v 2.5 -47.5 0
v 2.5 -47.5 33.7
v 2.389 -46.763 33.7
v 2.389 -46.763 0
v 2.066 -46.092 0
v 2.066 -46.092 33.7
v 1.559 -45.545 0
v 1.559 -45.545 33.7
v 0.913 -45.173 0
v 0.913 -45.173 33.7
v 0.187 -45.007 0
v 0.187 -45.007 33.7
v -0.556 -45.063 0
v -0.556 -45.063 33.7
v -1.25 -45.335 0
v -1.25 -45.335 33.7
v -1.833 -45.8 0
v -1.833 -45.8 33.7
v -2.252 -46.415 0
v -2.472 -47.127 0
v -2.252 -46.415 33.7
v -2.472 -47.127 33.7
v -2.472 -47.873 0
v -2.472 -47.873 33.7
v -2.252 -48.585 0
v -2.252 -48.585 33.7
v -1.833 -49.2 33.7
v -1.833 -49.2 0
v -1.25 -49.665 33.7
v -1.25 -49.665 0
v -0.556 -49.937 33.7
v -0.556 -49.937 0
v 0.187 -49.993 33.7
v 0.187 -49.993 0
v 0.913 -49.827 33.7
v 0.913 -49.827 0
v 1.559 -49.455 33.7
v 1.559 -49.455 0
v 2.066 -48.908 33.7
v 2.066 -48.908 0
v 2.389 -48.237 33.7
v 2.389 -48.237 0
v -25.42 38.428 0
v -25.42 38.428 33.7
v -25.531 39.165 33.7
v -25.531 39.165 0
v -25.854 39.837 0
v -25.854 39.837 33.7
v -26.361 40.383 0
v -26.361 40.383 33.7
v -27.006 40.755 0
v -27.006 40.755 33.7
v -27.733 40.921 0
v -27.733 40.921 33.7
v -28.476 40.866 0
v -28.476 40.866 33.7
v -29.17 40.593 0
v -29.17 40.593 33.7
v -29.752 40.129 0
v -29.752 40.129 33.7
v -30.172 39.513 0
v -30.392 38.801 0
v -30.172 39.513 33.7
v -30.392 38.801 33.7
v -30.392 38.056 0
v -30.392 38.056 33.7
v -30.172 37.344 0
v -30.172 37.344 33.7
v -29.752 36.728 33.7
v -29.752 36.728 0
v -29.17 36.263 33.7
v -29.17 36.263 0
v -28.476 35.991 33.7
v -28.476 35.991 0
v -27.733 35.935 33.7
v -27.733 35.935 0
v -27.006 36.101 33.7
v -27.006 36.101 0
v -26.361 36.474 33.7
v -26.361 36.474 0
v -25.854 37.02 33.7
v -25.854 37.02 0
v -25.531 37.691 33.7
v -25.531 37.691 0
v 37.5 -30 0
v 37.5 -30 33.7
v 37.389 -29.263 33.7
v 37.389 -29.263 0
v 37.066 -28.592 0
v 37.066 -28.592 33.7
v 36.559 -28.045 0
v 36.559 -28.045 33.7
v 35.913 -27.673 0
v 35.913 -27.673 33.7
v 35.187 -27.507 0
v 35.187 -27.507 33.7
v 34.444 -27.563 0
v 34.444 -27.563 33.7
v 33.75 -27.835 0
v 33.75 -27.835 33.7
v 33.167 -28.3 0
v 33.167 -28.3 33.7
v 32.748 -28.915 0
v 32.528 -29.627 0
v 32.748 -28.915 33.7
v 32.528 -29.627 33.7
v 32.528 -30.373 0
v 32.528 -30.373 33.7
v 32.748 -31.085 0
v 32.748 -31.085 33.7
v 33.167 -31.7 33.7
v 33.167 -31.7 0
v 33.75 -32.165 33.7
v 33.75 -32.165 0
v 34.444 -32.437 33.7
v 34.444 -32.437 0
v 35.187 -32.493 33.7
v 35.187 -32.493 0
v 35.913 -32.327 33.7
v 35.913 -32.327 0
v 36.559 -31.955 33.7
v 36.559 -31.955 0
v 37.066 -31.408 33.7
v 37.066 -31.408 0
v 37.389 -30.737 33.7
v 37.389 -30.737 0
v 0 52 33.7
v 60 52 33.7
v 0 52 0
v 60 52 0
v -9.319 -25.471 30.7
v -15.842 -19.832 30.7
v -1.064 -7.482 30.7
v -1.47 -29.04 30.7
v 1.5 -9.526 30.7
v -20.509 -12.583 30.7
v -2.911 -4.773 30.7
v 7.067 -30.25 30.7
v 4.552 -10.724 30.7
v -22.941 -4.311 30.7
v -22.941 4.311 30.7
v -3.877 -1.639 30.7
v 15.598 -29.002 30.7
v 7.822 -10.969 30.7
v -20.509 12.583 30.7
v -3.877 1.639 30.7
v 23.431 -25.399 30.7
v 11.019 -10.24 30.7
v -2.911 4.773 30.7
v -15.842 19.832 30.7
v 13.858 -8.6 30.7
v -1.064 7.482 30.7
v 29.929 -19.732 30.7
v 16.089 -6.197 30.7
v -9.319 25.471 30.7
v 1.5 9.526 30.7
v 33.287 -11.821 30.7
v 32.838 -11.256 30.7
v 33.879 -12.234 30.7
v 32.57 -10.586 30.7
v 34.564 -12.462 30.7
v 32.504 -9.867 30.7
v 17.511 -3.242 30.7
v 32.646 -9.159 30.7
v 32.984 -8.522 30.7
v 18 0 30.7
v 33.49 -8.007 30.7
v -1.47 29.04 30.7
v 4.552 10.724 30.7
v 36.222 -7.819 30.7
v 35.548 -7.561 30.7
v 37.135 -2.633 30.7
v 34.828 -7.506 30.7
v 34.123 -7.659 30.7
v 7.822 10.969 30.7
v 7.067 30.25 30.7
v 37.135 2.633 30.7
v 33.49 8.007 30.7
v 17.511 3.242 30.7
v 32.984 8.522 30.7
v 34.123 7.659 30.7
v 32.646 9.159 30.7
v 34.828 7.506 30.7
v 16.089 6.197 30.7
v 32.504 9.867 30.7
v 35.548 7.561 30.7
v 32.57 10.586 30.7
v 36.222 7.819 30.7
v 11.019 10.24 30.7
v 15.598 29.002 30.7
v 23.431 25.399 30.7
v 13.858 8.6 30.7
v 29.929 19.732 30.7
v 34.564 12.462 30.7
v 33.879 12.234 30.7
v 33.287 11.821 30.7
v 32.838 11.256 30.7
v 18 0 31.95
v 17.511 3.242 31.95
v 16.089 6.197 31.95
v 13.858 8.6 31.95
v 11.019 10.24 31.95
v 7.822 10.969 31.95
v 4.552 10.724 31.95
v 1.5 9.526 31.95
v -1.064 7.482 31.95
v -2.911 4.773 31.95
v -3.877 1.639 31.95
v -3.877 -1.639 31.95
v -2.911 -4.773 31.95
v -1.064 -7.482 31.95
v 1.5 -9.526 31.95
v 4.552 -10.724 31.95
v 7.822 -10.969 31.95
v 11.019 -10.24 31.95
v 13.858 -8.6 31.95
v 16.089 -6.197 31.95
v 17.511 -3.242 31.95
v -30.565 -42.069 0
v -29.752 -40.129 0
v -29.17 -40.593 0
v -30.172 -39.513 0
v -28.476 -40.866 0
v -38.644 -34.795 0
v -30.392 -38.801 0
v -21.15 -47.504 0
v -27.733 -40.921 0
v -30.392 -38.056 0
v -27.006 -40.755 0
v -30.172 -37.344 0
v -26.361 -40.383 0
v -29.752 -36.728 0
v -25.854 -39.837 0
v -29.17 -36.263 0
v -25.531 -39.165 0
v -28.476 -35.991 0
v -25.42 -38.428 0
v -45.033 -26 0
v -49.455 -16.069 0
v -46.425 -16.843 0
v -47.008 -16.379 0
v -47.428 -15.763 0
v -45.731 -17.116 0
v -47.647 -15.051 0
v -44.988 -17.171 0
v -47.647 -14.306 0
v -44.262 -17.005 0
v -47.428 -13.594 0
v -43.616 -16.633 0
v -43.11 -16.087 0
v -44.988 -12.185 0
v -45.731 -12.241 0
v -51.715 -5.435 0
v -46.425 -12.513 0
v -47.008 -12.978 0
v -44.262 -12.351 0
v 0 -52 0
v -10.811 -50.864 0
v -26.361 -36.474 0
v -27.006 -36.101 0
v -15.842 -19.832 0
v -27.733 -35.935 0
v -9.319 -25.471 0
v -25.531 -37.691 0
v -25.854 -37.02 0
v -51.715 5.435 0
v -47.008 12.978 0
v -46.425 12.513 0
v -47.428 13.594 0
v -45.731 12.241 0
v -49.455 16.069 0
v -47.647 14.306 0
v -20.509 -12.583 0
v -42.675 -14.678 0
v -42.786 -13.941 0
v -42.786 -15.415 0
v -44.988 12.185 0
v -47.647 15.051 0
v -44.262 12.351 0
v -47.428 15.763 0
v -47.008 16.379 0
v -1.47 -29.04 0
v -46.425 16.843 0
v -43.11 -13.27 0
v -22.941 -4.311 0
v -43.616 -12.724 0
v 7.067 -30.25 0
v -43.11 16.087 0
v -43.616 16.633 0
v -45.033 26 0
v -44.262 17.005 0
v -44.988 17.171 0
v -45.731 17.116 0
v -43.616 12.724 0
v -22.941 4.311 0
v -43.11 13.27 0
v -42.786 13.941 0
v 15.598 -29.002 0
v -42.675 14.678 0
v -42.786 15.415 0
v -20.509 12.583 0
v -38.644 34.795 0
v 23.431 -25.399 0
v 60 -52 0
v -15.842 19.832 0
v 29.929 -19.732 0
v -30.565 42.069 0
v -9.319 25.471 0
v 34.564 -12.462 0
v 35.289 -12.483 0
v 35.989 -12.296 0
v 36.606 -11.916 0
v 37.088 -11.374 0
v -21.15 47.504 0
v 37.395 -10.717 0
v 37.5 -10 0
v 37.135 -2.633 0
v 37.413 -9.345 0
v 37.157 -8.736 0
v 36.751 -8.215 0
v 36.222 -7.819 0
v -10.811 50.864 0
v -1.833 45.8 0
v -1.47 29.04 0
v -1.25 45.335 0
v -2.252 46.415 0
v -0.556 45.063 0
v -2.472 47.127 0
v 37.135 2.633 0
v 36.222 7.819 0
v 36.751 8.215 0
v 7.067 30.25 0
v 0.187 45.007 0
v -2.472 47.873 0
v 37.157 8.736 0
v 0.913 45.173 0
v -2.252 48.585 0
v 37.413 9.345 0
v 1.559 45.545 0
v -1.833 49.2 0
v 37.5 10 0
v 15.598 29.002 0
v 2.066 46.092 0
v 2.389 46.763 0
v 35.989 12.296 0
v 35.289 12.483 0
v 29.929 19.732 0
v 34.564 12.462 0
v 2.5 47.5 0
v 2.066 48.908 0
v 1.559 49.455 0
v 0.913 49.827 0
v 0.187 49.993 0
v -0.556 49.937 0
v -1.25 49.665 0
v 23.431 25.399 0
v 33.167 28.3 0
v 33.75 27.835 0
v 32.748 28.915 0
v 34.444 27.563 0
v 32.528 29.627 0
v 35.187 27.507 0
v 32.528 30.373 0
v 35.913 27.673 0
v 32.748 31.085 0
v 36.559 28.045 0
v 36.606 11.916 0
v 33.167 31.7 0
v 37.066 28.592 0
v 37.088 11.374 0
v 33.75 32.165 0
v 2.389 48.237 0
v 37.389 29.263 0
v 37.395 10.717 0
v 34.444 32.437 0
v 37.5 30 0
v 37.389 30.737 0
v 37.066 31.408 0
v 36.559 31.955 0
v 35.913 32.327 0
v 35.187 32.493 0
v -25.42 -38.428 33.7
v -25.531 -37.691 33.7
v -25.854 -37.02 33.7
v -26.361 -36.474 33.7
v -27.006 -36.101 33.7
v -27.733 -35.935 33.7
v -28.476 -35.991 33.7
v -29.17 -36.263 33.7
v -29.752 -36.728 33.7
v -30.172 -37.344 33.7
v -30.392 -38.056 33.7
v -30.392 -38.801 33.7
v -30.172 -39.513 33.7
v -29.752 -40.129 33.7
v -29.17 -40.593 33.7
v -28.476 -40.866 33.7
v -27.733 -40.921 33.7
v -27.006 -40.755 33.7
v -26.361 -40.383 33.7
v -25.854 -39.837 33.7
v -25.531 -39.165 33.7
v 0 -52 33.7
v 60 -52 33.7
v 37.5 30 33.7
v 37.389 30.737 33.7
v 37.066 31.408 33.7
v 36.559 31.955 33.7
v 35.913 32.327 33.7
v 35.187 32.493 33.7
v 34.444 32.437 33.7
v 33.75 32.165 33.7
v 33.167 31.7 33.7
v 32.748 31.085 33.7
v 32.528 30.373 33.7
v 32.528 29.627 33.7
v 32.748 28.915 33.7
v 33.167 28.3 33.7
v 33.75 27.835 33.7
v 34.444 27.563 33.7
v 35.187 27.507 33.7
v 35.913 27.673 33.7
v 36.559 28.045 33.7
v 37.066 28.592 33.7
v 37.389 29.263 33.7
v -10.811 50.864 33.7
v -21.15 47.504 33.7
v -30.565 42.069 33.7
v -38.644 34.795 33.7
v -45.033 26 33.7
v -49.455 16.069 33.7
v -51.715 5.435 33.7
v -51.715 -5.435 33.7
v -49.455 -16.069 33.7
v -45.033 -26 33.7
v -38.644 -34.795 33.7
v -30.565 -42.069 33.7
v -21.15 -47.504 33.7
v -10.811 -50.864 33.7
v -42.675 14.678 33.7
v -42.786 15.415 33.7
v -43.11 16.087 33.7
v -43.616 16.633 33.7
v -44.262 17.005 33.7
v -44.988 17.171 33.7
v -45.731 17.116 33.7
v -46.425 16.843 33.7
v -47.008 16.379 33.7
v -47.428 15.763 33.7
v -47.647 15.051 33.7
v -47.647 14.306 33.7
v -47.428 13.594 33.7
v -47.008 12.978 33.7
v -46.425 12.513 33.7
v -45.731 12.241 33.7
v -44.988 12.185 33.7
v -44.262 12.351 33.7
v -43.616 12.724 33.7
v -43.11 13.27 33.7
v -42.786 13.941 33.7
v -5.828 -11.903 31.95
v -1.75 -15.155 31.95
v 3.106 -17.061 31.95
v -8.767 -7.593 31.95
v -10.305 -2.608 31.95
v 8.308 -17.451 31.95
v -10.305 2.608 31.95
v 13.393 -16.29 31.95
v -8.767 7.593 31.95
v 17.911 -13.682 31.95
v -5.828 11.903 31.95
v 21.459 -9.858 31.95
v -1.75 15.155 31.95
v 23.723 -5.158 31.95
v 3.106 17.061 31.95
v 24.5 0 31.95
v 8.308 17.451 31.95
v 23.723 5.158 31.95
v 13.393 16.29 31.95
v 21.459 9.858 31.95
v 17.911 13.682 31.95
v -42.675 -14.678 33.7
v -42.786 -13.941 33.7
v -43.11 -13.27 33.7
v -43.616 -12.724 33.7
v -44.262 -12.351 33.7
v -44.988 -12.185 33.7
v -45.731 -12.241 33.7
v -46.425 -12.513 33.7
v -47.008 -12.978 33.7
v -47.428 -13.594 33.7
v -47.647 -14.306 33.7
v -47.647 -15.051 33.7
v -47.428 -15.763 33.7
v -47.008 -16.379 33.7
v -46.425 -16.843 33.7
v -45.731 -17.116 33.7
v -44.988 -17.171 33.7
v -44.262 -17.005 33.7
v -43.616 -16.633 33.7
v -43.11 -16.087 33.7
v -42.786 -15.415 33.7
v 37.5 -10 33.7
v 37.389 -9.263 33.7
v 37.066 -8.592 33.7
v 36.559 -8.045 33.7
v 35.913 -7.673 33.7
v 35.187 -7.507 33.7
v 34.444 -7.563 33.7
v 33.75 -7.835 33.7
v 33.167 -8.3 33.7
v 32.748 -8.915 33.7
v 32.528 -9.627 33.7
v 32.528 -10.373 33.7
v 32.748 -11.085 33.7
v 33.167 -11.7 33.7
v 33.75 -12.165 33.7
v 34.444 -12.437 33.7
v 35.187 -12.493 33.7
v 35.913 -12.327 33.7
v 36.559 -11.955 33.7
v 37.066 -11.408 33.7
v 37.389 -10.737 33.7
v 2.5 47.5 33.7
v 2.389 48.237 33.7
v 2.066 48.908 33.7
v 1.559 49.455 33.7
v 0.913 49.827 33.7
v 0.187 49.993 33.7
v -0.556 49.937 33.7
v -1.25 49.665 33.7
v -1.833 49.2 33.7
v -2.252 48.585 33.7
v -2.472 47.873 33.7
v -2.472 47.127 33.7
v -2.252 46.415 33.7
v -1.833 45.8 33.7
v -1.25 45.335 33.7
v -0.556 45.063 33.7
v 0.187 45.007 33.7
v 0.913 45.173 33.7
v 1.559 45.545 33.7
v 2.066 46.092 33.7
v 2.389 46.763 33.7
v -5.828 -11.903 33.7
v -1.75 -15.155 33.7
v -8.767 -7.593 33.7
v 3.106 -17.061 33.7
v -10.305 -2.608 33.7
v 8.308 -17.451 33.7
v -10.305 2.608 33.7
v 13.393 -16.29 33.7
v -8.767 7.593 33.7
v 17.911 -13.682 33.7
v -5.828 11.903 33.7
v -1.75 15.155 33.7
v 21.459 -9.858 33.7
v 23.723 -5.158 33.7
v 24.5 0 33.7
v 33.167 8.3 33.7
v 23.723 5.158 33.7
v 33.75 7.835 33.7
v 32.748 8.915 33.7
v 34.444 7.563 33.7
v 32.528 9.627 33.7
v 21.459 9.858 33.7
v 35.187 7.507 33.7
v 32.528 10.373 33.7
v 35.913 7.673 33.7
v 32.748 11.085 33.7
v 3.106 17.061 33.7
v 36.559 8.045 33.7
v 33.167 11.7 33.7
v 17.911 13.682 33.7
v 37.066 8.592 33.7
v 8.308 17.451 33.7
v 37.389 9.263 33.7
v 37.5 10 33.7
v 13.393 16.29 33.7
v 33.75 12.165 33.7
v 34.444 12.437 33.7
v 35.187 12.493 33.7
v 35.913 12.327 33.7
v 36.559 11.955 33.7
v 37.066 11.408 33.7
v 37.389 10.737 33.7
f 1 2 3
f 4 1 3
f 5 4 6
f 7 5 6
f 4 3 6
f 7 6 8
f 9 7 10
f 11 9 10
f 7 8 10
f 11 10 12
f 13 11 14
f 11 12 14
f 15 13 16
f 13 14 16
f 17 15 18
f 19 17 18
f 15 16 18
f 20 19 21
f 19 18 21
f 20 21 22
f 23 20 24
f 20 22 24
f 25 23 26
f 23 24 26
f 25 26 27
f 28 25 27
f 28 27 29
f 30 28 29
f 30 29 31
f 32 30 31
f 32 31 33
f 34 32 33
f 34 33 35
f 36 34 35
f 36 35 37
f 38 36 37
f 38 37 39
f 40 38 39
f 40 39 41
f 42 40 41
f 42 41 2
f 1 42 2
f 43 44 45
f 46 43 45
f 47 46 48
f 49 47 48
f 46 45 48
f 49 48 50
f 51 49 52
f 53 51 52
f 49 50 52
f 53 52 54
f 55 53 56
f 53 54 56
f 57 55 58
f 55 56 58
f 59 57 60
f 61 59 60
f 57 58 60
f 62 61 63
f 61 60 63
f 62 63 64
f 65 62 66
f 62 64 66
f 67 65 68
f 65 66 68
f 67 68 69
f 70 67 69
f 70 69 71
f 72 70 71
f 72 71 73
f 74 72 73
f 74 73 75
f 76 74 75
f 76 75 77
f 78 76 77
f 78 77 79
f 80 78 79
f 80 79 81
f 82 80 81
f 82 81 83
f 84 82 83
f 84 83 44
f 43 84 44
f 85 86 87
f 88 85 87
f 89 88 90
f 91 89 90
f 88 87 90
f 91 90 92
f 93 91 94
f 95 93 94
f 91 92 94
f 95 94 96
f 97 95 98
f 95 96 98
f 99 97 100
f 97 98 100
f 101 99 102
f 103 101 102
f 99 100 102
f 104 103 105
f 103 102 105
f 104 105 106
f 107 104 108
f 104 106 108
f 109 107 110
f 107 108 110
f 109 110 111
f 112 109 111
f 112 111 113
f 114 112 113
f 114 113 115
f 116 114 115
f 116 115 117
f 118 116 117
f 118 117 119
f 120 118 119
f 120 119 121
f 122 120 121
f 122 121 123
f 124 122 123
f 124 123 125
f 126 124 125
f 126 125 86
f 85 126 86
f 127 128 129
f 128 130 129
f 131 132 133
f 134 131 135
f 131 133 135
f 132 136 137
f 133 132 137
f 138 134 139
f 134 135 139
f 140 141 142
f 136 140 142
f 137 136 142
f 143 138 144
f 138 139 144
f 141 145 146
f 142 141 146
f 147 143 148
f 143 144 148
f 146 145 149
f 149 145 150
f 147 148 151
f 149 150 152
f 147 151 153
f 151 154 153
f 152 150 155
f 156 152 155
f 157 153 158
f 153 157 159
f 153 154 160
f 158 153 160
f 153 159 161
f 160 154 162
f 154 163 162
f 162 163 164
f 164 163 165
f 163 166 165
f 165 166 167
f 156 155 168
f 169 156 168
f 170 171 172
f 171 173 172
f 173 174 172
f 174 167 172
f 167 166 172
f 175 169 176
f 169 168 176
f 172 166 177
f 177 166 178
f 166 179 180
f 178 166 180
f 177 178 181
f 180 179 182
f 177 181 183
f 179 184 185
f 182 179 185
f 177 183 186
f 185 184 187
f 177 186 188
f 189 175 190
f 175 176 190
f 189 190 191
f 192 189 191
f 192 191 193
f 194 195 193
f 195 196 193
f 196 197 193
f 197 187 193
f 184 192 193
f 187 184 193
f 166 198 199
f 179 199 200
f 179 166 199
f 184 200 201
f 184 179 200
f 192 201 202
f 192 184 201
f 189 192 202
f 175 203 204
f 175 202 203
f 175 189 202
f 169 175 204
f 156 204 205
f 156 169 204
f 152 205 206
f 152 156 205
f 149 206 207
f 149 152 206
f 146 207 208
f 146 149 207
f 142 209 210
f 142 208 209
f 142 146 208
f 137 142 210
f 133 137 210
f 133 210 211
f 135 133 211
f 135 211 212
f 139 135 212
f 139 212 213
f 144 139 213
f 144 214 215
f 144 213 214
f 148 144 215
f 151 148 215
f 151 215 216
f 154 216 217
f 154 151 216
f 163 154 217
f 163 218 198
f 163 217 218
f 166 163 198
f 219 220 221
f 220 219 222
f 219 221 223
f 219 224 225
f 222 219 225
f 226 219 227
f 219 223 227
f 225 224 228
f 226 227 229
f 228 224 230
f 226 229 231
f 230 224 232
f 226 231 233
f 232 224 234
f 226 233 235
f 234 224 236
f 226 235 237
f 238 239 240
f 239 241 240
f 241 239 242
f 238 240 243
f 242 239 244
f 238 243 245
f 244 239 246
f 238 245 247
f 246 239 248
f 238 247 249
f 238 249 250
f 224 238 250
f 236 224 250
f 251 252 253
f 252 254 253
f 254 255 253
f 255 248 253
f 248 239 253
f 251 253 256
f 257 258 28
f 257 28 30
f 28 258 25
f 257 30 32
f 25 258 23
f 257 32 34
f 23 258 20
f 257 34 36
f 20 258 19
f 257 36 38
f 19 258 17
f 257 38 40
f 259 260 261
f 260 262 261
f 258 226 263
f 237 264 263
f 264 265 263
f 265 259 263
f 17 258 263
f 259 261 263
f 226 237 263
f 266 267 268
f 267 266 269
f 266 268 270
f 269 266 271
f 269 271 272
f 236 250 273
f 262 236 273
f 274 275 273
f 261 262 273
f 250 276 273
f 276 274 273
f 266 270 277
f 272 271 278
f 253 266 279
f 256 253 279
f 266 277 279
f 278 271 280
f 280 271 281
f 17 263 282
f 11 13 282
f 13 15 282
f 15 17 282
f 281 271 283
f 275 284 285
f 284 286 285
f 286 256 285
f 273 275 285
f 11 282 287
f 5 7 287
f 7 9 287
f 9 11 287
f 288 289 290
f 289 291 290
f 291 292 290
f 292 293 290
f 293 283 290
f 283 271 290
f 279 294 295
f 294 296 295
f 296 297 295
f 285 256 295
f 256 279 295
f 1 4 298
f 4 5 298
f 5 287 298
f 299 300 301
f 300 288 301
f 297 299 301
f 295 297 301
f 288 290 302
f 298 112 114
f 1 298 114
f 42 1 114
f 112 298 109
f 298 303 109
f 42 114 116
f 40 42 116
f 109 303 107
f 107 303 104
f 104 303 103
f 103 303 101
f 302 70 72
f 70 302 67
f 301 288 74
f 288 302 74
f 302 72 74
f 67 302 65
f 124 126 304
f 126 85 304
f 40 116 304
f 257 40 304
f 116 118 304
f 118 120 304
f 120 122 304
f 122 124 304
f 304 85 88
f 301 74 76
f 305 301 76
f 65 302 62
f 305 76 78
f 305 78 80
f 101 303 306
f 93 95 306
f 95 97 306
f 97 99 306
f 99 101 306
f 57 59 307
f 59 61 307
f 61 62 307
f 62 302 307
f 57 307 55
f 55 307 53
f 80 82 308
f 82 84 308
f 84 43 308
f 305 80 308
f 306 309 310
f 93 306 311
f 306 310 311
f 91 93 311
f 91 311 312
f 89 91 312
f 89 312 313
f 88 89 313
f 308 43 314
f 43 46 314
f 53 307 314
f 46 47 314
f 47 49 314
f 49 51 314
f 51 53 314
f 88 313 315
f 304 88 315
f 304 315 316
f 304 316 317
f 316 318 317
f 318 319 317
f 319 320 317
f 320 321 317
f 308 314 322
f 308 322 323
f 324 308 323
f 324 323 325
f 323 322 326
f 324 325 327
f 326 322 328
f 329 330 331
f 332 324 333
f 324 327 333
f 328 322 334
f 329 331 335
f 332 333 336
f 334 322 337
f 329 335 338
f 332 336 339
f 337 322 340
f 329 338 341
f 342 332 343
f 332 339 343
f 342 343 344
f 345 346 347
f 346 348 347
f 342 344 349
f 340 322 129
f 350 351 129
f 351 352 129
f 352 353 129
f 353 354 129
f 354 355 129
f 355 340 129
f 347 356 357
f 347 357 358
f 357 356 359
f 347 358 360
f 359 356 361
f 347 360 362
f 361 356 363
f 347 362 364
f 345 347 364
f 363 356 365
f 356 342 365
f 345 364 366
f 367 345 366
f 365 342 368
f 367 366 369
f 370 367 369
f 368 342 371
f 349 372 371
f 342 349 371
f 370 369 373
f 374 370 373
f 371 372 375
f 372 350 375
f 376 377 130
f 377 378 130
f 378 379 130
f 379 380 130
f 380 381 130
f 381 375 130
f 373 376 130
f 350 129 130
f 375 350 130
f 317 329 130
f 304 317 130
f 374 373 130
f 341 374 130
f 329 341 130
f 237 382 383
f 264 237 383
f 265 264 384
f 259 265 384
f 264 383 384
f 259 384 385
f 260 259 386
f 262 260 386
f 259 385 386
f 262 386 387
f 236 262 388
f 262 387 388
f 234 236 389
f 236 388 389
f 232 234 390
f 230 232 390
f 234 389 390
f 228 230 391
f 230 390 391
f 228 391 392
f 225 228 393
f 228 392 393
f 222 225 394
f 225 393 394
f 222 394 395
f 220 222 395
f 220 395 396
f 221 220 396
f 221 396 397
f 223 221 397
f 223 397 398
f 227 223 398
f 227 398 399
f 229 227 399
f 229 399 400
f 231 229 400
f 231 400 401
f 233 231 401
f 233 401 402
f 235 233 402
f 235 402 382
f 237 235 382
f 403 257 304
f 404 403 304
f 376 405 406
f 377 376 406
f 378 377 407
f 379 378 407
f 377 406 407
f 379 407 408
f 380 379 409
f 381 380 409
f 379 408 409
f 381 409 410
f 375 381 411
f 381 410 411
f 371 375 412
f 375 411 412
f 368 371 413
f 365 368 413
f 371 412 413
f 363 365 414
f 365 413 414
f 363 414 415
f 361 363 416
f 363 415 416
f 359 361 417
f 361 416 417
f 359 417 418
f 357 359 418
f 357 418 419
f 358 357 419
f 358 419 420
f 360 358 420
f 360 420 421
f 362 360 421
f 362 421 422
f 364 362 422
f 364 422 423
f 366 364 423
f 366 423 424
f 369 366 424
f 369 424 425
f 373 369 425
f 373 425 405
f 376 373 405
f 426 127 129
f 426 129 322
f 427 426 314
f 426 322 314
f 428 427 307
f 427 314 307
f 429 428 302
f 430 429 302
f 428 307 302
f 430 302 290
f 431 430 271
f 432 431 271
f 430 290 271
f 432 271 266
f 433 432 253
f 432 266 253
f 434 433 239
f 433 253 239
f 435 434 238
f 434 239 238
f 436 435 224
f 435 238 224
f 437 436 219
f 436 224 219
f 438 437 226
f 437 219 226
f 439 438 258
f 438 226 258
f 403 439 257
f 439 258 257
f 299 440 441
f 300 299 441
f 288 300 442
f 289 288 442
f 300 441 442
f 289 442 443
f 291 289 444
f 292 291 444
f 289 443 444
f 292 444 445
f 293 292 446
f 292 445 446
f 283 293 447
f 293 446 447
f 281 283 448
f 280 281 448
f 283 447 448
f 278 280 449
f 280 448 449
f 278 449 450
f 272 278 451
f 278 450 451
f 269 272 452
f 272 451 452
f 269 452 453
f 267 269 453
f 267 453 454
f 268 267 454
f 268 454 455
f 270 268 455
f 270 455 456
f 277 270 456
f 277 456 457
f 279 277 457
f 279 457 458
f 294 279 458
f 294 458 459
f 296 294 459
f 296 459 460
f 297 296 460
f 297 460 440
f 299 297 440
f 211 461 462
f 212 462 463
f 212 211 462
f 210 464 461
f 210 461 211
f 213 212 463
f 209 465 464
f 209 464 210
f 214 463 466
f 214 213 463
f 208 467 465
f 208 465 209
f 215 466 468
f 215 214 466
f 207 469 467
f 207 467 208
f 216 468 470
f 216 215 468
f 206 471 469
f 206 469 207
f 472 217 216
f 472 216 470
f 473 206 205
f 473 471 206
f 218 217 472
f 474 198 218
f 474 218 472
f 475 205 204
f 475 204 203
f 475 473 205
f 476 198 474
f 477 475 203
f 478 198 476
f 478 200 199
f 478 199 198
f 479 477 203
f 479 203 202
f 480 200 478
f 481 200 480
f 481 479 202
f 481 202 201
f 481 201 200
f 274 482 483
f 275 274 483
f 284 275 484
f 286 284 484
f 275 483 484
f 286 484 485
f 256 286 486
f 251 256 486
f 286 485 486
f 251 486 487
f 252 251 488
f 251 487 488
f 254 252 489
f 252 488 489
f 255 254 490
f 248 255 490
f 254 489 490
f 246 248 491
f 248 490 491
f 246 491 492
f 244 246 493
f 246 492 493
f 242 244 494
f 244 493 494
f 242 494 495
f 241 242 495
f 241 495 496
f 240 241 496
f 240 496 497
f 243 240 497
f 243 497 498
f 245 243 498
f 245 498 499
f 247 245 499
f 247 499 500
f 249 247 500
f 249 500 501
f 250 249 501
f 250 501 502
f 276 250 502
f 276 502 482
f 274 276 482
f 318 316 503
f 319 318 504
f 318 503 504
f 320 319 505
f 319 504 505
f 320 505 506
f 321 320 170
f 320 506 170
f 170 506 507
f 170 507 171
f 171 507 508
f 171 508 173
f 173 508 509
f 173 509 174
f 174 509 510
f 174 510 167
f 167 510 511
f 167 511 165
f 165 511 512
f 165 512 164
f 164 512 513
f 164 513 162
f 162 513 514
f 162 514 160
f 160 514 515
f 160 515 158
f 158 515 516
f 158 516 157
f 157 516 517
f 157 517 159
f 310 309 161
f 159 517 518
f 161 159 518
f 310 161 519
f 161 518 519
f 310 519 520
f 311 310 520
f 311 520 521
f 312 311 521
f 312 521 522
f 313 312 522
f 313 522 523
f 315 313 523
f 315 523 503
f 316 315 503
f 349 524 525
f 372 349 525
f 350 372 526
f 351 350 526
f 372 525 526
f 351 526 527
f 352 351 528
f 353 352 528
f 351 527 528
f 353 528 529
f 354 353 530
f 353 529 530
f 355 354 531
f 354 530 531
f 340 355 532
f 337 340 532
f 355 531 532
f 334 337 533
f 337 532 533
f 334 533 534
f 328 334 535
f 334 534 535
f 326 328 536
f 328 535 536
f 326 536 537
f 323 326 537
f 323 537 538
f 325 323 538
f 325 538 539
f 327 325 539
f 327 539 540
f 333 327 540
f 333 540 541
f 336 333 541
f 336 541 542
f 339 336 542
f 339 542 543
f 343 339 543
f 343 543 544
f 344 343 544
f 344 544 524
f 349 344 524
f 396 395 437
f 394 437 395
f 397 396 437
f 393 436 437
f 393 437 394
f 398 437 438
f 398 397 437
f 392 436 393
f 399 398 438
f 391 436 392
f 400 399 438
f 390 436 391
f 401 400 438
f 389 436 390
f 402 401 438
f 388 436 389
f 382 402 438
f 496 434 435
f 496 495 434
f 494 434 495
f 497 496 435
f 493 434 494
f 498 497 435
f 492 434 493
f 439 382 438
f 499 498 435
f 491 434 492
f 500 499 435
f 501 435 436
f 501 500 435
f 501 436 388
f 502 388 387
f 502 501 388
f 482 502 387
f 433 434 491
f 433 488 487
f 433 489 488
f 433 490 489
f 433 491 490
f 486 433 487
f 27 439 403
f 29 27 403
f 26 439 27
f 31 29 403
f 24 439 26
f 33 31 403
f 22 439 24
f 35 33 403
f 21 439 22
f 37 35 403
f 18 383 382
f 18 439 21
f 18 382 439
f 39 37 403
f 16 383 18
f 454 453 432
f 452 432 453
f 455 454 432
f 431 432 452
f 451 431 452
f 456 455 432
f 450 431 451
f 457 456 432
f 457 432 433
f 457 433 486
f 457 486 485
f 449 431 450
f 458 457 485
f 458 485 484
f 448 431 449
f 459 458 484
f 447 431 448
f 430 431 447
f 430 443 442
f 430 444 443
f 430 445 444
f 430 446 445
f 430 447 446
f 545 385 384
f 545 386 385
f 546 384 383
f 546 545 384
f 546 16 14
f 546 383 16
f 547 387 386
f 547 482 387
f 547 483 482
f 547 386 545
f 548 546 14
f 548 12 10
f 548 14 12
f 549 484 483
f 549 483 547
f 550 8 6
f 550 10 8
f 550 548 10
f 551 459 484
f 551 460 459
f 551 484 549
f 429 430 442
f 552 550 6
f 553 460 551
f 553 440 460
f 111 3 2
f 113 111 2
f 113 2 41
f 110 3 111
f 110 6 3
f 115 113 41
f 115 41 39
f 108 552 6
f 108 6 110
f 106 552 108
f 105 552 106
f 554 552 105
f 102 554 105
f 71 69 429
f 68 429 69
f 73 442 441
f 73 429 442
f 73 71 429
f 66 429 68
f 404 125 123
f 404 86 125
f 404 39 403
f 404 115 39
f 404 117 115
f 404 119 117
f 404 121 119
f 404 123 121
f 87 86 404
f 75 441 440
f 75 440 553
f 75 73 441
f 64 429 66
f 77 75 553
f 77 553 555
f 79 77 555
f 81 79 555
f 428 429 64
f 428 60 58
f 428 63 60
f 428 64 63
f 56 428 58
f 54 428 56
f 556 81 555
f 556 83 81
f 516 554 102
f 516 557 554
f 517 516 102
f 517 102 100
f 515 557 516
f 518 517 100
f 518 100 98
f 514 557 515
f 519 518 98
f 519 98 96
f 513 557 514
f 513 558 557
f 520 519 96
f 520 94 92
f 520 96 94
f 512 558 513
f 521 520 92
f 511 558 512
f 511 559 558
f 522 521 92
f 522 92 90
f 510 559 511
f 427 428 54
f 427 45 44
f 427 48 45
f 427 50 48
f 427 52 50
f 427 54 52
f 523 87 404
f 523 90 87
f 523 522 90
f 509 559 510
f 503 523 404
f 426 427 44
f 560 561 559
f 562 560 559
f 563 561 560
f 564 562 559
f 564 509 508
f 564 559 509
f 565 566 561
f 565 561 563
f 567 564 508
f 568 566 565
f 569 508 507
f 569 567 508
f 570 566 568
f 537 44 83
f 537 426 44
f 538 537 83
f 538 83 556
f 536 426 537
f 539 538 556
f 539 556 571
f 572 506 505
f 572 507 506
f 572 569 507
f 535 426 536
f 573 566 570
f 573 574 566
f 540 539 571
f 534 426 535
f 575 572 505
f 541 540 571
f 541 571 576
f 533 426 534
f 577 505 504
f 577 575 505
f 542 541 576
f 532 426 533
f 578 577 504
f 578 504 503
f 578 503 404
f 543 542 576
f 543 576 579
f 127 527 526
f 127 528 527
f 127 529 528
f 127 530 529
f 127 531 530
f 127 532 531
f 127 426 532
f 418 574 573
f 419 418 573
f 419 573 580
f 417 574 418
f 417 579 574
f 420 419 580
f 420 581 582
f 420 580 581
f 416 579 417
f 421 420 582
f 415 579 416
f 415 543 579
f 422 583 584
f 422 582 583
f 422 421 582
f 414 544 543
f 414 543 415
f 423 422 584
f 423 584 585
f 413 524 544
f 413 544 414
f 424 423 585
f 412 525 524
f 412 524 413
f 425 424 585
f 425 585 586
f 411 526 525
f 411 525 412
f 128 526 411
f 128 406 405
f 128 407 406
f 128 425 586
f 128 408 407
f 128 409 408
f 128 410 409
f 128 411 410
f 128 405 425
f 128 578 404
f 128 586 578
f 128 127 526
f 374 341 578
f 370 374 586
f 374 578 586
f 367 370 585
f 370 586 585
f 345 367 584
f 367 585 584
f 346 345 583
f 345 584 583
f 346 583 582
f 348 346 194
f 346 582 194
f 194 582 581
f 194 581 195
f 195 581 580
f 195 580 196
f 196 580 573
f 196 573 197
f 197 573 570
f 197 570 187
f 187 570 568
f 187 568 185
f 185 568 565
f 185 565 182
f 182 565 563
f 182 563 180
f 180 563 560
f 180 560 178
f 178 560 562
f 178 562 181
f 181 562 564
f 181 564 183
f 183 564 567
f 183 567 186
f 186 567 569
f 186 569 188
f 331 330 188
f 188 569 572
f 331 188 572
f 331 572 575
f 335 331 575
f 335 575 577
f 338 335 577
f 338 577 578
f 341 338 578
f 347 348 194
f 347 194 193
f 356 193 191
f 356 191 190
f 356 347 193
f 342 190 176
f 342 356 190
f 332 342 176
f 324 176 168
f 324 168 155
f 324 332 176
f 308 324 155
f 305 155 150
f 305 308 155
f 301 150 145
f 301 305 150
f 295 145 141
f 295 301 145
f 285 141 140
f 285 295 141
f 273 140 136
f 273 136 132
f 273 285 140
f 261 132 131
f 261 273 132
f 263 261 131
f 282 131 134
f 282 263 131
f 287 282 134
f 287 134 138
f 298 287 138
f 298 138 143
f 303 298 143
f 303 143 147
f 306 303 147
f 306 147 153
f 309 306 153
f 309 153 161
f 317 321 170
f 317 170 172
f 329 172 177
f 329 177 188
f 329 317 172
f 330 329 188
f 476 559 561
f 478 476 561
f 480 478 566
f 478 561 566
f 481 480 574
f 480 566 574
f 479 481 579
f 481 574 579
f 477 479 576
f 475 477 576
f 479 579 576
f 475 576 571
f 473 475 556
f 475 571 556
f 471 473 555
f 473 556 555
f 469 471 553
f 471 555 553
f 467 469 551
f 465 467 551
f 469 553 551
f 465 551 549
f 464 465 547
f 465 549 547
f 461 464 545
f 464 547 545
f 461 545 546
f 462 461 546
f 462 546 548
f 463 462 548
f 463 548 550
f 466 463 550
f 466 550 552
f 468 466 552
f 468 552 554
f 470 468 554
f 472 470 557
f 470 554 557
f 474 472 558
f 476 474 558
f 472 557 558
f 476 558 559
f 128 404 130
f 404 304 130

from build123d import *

# Parameters (mm, degrees)
CROQUIS1_R              = 30.25
SALIENTE_EXTRUIR1_DEPTH = 30.7
CROQUIS2_R              = 11
SALIENTE_EXTRUIR2_DEPTH = 3
CROQUIS3_R              = 17.5
CORTAR_EXTRUIR1_DEPTH   = 1.75
CROQUIS4_R              = 2.5
CORTAR_EXTRUIR2_DEPTH   = 87.253637604


with BuildPart() as part:
    # Croquis1 → Saliente-Extruir1 (new body)
    with BuildSketch(Plane.XY):
        with BuildLine():
            Line((0, -52), (60, -52))
            Line((60, -52), (60, 52))
            Line((60, 52), (0, 52))
            ThreePointArc((0, 52), (-52, 0), (0, -52))
        make_face()
        with Locations((7, 0)):
            Circle(CROQUIS1_R, mode=Mode.SUBTRACT)
    extrude(amount=SALIENTE_EXTRUIR1_DEPTH)

    # Croquis2 → Saliente-Extruir2 (add)
    with BuildSketch(Plane.XY.offset(30.7)):
        with BuildLine():
            Line((0, -52), (60, -52))
            Line((60, -52), (60, 52))
            Line((60, 52), (0, 52))
            ThreePointArc((0, 52), (-52, 0), (0, -52))
        make_face()
        with Locations((7, 0)):
            Circle(CROQUIS2_R, mode=Mode.SUBTRACT)
    extrude(amount=SALIENTE_EXTRUIR2_DEPTH)

    # Croquis3 → Cortar-Extruir1 (cut)
    with BuildSketch(Plane.XY.offset(33.7)):
        with Locations((7, 0)):
            Circle(CROQUIS3_R)
    extrude(amount=-CORTAR_EXTRUIR1_DEPTH, mode=Mode.SUBTRACT)

    # Croquis4 → Cortar-Extruir2 (cut, through all)
    with BuildSketch(Plane.XY.offset(33.7)):
        with Locations((35, 30)):
            Circle(CROQUIS4_R)
        with Locations((0, 47.5)):
            Circle(CROQUIS4_R)
        with Locations((-27.919799484, 38.428307233)):
            Circle(CROQUIS4_R)
        with Locations((-45.175184524, 14.678307233)):
            Circle(CROQUIS4_R)
        with Locations((-45.175184524, -14.678307233)):
            Circle(CROQUIS4_R)
        with Locations((-27.919799484, -38.428307233)):
            Circle(CROQUIS4_R)
        with Locations((0, -47.5)):
            Circle(CROQUIS4_R)
        with Locations((35, 10)):
            Circle(CROQUIS4_R)
        with Locations((35, -10)):
            Circle(CROQUIS4_R)
        with Locations((35, -30)):
            Circle(CROQUIS4_R)
    extrude(amount=-CORTAR_EXTRUIR2_DEPTH, mode=Mode.SUBTRACT)


solid = part.part
